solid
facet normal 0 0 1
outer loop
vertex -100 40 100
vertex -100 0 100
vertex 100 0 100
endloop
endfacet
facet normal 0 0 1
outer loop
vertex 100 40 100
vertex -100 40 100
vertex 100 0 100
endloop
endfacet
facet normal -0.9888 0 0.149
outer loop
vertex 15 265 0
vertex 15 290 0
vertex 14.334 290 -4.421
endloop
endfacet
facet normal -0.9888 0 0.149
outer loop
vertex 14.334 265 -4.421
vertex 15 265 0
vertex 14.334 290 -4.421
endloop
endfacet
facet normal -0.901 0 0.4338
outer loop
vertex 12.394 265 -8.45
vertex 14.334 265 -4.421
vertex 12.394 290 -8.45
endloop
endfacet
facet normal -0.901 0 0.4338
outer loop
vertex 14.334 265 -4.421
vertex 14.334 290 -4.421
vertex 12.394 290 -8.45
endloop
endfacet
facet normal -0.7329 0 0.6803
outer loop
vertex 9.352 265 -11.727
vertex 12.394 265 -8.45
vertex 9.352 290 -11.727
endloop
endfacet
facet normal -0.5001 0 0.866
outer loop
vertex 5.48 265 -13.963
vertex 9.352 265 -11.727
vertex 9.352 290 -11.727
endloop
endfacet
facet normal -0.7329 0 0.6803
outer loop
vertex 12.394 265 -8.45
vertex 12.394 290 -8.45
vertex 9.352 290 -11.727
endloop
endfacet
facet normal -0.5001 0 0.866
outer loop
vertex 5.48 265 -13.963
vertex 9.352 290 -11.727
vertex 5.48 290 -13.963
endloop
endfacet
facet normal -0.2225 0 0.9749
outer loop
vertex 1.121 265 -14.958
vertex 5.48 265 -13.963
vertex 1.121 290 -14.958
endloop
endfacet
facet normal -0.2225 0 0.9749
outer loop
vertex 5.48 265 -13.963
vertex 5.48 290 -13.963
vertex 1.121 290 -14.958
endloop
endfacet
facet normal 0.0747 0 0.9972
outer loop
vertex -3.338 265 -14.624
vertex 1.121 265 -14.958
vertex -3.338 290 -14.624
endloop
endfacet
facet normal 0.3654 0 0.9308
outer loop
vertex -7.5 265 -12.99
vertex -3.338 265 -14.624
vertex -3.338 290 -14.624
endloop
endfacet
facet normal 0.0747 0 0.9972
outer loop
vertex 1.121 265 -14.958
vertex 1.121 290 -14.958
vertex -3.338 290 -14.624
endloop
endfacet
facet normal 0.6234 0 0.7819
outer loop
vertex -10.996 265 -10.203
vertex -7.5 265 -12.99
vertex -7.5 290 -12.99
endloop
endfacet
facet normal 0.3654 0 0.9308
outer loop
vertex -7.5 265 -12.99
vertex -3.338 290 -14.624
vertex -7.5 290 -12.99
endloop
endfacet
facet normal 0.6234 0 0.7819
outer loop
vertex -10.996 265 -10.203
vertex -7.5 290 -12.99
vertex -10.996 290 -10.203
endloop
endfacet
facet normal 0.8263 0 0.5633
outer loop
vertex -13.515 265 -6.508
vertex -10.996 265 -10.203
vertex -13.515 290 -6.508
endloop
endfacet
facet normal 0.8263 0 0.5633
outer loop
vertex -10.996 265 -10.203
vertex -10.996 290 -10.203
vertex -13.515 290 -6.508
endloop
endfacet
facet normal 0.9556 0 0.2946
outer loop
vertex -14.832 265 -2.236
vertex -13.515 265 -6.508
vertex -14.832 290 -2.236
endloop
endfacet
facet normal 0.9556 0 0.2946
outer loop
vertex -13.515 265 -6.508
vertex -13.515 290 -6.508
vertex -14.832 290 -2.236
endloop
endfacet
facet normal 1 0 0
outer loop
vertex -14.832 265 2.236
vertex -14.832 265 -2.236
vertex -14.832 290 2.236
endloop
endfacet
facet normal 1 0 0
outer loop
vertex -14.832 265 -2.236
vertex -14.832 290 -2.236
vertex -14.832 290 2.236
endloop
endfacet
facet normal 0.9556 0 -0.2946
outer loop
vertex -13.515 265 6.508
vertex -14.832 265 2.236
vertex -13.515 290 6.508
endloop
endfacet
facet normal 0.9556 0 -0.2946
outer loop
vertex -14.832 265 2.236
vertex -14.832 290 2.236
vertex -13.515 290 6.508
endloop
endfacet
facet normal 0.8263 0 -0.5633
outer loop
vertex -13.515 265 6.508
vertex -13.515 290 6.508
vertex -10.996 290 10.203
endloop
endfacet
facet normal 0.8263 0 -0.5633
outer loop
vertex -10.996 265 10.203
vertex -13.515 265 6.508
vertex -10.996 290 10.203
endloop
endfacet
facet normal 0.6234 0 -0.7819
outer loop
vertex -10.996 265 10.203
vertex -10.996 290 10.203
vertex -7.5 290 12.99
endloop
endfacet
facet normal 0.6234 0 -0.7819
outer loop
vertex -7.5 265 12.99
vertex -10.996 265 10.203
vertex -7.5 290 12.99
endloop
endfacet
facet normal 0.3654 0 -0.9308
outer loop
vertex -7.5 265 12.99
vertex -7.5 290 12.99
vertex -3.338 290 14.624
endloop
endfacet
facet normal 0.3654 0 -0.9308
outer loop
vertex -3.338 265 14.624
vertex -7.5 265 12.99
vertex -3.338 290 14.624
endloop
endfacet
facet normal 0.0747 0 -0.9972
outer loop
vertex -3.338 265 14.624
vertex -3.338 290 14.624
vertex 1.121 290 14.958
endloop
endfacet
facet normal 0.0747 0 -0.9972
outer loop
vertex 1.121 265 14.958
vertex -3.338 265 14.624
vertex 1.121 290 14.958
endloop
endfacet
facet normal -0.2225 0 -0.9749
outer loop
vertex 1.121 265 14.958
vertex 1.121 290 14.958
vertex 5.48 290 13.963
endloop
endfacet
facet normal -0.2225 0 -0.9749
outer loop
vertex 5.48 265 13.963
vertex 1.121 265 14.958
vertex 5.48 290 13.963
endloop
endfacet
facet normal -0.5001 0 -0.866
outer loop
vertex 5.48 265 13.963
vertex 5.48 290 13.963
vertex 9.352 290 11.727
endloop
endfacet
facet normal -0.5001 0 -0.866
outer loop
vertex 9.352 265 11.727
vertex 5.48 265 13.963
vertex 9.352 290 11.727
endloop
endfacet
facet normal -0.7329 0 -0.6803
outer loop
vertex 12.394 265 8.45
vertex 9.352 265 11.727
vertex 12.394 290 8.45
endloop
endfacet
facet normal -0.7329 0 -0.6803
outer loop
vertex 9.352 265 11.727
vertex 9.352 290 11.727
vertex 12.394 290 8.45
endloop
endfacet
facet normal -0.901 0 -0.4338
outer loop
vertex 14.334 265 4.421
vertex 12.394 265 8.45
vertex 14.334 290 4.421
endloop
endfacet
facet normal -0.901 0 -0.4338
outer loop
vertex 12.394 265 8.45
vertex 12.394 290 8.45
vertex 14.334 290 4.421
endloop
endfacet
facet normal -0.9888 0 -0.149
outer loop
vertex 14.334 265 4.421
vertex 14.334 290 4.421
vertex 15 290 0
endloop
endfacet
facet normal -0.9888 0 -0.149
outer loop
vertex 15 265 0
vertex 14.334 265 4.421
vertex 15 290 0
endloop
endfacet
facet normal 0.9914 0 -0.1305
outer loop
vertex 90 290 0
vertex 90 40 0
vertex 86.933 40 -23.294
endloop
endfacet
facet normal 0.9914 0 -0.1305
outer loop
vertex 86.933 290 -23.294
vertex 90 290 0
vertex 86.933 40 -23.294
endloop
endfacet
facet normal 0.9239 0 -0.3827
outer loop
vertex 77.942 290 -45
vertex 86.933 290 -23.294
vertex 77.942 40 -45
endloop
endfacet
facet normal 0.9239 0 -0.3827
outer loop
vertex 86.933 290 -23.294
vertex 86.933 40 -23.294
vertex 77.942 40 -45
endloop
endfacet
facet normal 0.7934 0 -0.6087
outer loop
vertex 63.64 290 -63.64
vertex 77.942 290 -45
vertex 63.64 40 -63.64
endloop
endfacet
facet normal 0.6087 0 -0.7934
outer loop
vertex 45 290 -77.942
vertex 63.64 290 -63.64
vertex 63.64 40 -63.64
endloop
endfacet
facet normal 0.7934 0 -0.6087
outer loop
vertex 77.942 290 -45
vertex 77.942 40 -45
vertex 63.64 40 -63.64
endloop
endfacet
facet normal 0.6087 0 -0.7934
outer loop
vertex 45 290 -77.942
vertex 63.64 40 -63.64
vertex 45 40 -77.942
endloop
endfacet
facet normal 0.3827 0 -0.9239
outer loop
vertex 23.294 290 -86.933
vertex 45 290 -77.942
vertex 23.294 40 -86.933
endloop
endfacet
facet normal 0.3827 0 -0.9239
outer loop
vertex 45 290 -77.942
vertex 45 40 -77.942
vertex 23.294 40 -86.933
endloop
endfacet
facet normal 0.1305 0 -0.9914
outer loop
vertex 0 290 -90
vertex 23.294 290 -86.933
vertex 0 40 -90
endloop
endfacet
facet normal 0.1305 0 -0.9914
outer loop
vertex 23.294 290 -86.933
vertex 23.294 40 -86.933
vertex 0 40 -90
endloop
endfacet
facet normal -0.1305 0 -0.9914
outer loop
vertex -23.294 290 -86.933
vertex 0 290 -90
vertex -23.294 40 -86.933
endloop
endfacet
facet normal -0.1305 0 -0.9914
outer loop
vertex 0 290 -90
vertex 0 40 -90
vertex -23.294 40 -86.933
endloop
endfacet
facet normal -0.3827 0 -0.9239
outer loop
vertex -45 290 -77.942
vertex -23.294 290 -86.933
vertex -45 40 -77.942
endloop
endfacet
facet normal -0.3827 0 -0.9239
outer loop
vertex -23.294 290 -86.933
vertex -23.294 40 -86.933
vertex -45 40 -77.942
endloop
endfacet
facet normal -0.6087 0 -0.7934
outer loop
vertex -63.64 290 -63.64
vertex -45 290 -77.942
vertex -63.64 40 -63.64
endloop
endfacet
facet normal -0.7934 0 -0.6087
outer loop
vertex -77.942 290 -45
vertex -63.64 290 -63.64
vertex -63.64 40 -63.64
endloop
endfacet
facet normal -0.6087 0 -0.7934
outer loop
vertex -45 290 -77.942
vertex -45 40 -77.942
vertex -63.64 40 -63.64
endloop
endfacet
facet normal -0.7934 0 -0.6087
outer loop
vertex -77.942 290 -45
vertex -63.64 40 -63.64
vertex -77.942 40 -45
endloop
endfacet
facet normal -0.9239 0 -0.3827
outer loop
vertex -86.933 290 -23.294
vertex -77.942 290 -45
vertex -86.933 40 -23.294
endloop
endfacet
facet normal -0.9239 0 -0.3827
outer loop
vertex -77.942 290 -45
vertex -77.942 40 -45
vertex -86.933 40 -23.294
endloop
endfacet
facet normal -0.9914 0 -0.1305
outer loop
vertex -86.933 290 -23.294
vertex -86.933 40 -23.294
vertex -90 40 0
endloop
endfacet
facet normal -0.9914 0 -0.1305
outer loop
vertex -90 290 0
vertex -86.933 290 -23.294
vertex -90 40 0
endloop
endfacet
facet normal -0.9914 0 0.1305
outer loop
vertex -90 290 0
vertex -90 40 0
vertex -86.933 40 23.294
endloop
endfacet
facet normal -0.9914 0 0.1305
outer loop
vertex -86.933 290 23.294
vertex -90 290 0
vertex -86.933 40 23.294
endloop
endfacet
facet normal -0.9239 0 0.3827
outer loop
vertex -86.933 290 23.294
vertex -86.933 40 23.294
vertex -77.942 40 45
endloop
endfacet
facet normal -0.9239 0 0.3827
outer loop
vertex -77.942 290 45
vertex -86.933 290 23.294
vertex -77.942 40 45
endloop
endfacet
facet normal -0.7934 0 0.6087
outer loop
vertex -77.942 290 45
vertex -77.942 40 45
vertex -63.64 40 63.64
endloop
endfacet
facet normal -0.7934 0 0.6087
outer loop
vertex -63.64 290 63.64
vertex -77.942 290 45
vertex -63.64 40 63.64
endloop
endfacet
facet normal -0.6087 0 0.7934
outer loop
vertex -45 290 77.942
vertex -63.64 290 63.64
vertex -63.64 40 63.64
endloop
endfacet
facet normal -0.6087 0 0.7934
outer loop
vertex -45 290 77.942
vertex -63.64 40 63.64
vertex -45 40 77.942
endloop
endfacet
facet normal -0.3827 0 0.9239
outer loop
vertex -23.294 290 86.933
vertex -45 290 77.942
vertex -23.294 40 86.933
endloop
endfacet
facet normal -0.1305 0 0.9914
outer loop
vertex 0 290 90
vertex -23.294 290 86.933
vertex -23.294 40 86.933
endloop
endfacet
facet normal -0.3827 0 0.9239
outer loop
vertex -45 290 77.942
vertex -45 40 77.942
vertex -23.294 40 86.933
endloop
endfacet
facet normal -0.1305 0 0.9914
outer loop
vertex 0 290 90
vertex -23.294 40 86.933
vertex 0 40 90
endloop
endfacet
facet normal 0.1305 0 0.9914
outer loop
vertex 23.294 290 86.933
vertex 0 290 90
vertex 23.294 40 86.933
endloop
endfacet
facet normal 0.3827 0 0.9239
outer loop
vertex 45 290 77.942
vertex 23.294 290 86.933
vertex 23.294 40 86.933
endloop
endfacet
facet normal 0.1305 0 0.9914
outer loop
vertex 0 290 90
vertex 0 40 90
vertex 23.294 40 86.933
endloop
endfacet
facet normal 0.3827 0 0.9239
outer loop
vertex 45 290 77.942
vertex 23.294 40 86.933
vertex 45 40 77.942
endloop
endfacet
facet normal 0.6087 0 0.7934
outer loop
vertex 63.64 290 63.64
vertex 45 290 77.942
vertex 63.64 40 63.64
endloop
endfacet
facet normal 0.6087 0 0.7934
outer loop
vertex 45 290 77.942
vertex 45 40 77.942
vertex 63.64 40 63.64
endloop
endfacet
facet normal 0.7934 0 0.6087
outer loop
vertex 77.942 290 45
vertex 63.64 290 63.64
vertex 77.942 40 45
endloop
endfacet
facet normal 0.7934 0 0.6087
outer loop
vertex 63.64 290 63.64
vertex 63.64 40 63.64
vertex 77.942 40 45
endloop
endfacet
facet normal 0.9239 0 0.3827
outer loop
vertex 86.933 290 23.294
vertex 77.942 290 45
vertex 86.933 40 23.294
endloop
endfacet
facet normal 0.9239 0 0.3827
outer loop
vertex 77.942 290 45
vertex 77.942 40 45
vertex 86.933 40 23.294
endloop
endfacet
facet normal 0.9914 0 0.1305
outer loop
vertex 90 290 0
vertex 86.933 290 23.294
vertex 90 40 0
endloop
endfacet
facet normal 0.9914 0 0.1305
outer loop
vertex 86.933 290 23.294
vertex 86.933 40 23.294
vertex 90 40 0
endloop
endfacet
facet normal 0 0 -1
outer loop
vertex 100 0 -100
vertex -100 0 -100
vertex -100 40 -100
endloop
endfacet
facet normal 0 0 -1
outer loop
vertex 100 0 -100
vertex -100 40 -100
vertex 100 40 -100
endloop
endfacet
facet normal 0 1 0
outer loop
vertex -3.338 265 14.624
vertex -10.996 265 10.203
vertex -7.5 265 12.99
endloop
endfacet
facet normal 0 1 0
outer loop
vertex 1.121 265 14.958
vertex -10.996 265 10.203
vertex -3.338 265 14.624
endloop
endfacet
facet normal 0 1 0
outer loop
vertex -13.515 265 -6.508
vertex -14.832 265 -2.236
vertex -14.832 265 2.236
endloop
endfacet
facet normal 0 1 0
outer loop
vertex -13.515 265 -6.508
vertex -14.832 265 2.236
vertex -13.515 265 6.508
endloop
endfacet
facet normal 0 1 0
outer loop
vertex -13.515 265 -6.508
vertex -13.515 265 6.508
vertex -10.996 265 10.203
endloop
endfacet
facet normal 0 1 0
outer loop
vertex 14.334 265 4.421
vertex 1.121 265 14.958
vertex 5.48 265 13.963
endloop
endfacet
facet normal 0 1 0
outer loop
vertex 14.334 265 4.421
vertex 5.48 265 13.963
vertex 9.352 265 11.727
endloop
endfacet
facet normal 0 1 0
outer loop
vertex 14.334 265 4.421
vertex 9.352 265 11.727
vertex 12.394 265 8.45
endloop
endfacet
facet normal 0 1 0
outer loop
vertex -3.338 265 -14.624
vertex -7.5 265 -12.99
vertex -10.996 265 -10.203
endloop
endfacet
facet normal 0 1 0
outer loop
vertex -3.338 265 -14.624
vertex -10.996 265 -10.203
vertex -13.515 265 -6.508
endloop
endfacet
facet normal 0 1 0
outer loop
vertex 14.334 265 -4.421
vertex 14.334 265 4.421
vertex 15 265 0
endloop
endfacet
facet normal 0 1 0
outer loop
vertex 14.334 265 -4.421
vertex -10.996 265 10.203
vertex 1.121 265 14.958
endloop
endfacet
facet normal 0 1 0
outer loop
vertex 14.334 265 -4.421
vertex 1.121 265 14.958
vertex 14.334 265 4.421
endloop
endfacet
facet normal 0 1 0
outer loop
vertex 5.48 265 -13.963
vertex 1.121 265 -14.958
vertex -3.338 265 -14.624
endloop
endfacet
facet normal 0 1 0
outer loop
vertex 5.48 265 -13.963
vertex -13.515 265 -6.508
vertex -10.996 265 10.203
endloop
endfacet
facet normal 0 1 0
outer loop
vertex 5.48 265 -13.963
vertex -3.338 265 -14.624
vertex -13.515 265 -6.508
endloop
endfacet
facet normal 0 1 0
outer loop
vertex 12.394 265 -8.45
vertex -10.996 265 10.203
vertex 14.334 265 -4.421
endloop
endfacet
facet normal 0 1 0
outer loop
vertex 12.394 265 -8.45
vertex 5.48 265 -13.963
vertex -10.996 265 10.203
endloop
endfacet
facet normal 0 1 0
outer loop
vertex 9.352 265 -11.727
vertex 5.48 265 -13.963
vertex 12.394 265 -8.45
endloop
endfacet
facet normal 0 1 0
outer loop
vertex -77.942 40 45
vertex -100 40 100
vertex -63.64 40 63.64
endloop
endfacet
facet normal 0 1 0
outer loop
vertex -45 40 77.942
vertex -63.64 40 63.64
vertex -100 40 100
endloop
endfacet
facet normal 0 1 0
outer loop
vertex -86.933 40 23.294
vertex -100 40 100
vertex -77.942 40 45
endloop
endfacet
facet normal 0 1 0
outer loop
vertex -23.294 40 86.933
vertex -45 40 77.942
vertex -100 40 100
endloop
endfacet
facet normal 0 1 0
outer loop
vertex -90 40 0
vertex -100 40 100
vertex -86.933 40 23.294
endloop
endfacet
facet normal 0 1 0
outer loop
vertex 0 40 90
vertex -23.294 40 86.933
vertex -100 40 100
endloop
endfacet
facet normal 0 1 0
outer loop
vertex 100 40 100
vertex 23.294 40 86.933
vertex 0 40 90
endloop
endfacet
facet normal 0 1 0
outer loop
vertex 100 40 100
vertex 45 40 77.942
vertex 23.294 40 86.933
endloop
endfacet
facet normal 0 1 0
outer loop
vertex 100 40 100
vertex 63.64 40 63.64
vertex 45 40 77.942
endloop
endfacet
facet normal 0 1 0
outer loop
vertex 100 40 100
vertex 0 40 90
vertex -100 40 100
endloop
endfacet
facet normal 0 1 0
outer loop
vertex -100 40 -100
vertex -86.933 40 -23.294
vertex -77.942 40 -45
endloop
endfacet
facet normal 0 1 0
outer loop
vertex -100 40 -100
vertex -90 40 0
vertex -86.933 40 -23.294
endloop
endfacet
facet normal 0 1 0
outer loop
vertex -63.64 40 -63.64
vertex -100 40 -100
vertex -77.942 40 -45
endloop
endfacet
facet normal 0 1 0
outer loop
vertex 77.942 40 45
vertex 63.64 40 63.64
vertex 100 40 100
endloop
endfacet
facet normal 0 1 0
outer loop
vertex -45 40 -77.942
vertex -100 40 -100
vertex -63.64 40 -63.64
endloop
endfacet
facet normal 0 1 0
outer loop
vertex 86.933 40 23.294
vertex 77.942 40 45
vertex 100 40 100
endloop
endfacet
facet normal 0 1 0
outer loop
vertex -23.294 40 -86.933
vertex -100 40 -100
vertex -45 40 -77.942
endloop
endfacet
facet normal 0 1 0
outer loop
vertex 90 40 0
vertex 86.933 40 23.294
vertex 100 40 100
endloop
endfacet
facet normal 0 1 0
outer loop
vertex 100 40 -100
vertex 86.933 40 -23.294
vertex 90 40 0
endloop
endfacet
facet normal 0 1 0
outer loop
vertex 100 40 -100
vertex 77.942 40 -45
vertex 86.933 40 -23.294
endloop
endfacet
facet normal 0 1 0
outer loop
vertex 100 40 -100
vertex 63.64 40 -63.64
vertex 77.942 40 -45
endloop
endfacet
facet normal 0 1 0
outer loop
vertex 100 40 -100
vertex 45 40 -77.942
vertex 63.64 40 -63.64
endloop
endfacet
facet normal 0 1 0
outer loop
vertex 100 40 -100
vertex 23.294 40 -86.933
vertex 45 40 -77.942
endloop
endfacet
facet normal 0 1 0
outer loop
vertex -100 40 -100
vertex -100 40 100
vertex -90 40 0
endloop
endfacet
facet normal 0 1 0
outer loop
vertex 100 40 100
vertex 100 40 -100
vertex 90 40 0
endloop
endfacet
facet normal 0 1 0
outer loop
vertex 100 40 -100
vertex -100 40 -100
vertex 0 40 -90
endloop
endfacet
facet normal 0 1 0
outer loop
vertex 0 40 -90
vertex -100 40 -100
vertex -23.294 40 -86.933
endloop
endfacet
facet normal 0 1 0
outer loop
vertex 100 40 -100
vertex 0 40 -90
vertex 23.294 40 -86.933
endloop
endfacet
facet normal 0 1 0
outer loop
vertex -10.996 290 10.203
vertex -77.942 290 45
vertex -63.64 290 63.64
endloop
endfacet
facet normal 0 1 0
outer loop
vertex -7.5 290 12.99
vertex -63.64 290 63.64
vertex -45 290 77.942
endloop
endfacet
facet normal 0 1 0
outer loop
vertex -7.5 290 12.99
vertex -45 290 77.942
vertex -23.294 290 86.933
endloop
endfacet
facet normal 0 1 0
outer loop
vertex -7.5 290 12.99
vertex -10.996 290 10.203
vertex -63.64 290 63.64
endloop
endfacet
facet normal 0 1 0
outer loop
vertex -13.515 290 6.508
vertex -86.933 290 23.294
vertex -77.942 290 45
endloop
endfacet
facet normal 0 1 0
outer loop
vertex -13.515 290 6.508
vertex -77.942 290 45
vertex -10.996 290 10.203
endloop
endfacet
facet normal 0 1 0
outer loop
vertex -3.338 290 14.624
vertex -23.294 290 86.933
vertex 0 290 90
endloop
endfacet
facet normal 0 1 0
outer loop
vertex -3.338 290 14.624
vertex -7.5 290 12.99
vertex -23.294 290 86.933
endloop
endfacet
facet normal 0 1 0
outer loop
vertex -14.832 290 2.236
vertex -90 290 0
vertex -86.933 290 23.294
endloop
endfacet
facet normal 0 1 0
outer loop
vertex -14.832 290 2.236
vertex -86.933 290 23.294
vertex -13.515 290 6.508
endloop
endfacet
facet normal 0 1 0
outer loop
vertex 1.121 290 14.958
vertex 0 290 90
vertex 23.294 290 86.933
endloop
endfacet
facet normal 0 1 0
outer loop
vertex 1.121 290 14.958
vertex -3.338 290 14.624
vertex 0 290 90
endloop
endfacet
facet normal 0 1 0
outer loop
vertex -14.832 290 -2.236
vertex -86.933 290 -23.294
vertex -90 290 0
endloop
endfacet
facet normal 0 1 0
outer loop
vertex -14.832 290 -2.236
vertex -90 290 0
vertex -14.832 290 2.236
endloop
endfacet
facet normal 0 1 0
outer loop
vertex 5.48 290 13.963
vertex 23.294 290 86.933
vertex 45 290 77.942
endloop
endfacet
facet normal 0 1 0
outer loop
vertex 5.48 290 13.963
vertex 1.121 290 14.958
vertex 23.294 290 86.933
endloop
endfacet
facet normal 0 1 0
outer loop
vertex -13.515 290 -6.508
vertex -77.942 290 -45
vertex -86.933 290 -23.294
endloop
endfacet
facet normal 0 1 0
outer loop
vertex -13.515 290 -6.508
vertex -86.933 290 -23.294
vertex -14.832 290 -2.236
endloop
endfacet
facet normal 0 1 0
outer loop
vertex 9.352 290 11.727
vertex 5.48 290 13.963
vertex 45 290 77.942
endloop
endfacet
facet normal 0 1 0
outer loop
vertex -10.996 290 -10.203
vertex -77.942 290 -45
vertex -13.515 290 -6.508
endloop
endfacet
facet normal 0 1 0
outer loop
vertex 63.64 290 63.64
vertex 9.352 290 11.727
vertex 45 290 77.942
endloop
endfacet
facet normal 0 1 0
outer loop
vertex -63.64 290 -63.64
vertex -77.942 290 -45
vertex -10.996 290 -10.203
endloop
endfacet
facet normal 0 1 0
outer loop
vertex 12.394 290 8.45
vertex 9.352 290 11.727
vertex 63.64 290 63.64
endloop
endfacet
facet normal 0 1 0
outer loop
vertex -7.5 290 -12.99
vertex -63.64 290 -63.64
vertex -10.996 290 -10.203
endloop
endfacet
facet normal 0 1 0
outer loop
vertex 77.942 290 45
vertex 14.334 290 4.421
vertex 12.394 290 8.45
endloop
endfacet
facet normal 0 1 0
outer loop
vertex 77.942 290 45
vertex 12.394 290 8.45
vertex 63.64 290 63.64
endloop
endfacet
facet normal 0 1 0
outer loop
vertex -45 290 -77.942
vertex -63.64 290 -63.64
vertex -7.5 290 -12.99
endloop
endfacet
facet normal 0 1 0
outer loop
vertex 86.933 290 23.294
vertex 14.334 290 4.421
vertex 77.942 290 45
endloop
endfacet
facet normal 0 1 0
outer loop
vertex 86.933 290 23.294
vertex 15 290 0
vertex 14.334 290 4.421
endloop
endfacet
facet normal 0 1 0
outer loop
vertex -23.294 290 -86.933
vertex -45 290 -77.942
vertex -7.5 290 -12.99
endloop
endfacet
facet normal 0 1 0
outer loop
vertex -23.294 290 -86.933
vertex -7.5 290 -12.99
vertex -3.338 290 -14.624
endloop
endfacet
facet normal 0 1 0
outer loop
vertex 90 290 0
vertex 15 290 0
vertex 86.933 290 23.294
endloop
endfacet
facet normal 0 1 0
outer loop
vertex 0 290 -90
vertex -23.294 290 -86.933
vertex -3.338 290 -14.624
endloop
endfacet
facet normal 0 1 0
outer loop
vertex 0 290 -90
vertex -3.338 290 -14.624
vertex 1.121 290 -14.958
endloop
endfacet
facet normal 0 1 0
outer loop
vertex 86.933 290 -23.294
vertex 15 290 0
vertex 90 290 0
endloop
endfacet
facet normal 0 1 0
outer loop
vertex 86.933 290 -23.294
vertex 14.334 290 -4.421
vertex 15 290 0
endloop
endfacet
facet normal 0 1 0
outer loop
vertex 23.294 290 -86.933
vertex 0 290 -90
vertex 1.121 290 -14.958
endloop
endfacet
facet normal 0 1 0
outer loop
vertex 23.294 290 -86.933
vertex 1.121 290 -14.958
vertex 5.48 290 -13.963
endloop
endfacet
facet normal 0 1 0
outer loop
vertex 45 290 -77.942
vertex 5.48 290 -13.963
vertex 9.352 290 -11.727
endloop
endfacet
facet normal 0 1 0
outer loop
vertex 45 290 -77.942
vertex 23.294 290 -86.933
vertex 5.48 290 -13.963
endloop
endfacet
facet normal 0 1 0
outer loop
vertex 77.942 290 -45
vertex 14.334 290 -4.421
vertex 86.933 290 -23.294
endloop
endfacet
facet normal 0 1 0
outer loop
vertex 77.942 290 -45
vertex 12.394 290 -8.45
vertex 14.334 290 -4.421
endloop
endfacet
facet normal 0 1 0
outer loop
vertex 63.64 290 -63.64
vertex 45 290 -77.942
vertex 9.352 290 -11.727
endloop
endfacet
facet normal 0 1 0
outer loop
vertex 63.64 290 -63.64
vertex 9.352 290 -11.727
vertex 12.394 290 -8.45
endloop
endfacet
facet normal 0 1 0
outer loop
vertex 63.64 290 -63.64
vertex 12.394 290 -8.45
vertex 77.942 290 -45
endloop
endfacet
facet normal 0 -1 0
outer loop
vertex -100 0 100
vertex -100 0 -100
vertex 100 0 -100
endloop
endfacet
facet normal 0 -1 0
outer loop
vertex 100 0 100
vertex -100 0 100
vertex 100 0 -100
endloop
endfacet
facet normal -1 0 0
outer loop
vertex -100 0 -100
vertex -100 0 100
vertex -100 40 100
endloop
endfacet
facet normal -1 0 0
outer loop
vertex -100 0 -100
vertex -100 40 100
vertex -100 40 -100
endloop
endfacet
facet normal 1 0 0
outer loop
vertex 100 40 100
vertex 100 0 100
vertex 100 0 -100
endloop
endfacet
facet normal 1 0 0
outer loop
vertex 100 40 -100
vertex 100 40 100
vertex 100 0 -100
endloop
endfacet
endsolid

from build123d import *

# Parameters (mm, degrees)
ESBO_O2_W                = 200
ESBO_O2_H                = 200
RESSALTO_EXTRUS_O1_DEPTH = 40
ESBO_O3_R                = 90
RESSALTO_EXTRUS_O2_DEPTH = 250
ESBO_O4_R                = 15
CORTE_EXTRUS_O1_DEPTH    = 25


with BuildPart() as part:
    # Esboço2 → Ressalto-extrusão1 (new body)
    with BuildSketch(Plane(origin=(0, 0, 0), x_dir=(1, 0, 0), z_dir=(0, 1, 0))):
        Rectangle(ESBO_O2_W, ESBO_O2_H)
    extrude(amount=RESSALTO_EXTRUS_O1_DEPTH)

    # Esboço3 → Ressalto-extrusão2 (add)
    with BuildSketch(Plane(origin=(0, 40, 0), x_dir=(1, 0, 0), z_dir=(0, 1, 0))):
        Circle(ESBO_O3_R)
    extrude(amount=RESSALTO_EXTRUS_O2_DEPTH)

    # Esboço4 → Corte-extrusão1 (cut)
    with BuildSketch(Plane(origin=(0, 290, 0), x_dir=(1, 0, 0), z_dir=(0, 1, 0))):
        Circle(ESBO_O4_R)
    extrude(amount=-CORTE_EXTRUS_O1_DEPTH, mode=Mode.SUBTRACT)


solid = part.part
